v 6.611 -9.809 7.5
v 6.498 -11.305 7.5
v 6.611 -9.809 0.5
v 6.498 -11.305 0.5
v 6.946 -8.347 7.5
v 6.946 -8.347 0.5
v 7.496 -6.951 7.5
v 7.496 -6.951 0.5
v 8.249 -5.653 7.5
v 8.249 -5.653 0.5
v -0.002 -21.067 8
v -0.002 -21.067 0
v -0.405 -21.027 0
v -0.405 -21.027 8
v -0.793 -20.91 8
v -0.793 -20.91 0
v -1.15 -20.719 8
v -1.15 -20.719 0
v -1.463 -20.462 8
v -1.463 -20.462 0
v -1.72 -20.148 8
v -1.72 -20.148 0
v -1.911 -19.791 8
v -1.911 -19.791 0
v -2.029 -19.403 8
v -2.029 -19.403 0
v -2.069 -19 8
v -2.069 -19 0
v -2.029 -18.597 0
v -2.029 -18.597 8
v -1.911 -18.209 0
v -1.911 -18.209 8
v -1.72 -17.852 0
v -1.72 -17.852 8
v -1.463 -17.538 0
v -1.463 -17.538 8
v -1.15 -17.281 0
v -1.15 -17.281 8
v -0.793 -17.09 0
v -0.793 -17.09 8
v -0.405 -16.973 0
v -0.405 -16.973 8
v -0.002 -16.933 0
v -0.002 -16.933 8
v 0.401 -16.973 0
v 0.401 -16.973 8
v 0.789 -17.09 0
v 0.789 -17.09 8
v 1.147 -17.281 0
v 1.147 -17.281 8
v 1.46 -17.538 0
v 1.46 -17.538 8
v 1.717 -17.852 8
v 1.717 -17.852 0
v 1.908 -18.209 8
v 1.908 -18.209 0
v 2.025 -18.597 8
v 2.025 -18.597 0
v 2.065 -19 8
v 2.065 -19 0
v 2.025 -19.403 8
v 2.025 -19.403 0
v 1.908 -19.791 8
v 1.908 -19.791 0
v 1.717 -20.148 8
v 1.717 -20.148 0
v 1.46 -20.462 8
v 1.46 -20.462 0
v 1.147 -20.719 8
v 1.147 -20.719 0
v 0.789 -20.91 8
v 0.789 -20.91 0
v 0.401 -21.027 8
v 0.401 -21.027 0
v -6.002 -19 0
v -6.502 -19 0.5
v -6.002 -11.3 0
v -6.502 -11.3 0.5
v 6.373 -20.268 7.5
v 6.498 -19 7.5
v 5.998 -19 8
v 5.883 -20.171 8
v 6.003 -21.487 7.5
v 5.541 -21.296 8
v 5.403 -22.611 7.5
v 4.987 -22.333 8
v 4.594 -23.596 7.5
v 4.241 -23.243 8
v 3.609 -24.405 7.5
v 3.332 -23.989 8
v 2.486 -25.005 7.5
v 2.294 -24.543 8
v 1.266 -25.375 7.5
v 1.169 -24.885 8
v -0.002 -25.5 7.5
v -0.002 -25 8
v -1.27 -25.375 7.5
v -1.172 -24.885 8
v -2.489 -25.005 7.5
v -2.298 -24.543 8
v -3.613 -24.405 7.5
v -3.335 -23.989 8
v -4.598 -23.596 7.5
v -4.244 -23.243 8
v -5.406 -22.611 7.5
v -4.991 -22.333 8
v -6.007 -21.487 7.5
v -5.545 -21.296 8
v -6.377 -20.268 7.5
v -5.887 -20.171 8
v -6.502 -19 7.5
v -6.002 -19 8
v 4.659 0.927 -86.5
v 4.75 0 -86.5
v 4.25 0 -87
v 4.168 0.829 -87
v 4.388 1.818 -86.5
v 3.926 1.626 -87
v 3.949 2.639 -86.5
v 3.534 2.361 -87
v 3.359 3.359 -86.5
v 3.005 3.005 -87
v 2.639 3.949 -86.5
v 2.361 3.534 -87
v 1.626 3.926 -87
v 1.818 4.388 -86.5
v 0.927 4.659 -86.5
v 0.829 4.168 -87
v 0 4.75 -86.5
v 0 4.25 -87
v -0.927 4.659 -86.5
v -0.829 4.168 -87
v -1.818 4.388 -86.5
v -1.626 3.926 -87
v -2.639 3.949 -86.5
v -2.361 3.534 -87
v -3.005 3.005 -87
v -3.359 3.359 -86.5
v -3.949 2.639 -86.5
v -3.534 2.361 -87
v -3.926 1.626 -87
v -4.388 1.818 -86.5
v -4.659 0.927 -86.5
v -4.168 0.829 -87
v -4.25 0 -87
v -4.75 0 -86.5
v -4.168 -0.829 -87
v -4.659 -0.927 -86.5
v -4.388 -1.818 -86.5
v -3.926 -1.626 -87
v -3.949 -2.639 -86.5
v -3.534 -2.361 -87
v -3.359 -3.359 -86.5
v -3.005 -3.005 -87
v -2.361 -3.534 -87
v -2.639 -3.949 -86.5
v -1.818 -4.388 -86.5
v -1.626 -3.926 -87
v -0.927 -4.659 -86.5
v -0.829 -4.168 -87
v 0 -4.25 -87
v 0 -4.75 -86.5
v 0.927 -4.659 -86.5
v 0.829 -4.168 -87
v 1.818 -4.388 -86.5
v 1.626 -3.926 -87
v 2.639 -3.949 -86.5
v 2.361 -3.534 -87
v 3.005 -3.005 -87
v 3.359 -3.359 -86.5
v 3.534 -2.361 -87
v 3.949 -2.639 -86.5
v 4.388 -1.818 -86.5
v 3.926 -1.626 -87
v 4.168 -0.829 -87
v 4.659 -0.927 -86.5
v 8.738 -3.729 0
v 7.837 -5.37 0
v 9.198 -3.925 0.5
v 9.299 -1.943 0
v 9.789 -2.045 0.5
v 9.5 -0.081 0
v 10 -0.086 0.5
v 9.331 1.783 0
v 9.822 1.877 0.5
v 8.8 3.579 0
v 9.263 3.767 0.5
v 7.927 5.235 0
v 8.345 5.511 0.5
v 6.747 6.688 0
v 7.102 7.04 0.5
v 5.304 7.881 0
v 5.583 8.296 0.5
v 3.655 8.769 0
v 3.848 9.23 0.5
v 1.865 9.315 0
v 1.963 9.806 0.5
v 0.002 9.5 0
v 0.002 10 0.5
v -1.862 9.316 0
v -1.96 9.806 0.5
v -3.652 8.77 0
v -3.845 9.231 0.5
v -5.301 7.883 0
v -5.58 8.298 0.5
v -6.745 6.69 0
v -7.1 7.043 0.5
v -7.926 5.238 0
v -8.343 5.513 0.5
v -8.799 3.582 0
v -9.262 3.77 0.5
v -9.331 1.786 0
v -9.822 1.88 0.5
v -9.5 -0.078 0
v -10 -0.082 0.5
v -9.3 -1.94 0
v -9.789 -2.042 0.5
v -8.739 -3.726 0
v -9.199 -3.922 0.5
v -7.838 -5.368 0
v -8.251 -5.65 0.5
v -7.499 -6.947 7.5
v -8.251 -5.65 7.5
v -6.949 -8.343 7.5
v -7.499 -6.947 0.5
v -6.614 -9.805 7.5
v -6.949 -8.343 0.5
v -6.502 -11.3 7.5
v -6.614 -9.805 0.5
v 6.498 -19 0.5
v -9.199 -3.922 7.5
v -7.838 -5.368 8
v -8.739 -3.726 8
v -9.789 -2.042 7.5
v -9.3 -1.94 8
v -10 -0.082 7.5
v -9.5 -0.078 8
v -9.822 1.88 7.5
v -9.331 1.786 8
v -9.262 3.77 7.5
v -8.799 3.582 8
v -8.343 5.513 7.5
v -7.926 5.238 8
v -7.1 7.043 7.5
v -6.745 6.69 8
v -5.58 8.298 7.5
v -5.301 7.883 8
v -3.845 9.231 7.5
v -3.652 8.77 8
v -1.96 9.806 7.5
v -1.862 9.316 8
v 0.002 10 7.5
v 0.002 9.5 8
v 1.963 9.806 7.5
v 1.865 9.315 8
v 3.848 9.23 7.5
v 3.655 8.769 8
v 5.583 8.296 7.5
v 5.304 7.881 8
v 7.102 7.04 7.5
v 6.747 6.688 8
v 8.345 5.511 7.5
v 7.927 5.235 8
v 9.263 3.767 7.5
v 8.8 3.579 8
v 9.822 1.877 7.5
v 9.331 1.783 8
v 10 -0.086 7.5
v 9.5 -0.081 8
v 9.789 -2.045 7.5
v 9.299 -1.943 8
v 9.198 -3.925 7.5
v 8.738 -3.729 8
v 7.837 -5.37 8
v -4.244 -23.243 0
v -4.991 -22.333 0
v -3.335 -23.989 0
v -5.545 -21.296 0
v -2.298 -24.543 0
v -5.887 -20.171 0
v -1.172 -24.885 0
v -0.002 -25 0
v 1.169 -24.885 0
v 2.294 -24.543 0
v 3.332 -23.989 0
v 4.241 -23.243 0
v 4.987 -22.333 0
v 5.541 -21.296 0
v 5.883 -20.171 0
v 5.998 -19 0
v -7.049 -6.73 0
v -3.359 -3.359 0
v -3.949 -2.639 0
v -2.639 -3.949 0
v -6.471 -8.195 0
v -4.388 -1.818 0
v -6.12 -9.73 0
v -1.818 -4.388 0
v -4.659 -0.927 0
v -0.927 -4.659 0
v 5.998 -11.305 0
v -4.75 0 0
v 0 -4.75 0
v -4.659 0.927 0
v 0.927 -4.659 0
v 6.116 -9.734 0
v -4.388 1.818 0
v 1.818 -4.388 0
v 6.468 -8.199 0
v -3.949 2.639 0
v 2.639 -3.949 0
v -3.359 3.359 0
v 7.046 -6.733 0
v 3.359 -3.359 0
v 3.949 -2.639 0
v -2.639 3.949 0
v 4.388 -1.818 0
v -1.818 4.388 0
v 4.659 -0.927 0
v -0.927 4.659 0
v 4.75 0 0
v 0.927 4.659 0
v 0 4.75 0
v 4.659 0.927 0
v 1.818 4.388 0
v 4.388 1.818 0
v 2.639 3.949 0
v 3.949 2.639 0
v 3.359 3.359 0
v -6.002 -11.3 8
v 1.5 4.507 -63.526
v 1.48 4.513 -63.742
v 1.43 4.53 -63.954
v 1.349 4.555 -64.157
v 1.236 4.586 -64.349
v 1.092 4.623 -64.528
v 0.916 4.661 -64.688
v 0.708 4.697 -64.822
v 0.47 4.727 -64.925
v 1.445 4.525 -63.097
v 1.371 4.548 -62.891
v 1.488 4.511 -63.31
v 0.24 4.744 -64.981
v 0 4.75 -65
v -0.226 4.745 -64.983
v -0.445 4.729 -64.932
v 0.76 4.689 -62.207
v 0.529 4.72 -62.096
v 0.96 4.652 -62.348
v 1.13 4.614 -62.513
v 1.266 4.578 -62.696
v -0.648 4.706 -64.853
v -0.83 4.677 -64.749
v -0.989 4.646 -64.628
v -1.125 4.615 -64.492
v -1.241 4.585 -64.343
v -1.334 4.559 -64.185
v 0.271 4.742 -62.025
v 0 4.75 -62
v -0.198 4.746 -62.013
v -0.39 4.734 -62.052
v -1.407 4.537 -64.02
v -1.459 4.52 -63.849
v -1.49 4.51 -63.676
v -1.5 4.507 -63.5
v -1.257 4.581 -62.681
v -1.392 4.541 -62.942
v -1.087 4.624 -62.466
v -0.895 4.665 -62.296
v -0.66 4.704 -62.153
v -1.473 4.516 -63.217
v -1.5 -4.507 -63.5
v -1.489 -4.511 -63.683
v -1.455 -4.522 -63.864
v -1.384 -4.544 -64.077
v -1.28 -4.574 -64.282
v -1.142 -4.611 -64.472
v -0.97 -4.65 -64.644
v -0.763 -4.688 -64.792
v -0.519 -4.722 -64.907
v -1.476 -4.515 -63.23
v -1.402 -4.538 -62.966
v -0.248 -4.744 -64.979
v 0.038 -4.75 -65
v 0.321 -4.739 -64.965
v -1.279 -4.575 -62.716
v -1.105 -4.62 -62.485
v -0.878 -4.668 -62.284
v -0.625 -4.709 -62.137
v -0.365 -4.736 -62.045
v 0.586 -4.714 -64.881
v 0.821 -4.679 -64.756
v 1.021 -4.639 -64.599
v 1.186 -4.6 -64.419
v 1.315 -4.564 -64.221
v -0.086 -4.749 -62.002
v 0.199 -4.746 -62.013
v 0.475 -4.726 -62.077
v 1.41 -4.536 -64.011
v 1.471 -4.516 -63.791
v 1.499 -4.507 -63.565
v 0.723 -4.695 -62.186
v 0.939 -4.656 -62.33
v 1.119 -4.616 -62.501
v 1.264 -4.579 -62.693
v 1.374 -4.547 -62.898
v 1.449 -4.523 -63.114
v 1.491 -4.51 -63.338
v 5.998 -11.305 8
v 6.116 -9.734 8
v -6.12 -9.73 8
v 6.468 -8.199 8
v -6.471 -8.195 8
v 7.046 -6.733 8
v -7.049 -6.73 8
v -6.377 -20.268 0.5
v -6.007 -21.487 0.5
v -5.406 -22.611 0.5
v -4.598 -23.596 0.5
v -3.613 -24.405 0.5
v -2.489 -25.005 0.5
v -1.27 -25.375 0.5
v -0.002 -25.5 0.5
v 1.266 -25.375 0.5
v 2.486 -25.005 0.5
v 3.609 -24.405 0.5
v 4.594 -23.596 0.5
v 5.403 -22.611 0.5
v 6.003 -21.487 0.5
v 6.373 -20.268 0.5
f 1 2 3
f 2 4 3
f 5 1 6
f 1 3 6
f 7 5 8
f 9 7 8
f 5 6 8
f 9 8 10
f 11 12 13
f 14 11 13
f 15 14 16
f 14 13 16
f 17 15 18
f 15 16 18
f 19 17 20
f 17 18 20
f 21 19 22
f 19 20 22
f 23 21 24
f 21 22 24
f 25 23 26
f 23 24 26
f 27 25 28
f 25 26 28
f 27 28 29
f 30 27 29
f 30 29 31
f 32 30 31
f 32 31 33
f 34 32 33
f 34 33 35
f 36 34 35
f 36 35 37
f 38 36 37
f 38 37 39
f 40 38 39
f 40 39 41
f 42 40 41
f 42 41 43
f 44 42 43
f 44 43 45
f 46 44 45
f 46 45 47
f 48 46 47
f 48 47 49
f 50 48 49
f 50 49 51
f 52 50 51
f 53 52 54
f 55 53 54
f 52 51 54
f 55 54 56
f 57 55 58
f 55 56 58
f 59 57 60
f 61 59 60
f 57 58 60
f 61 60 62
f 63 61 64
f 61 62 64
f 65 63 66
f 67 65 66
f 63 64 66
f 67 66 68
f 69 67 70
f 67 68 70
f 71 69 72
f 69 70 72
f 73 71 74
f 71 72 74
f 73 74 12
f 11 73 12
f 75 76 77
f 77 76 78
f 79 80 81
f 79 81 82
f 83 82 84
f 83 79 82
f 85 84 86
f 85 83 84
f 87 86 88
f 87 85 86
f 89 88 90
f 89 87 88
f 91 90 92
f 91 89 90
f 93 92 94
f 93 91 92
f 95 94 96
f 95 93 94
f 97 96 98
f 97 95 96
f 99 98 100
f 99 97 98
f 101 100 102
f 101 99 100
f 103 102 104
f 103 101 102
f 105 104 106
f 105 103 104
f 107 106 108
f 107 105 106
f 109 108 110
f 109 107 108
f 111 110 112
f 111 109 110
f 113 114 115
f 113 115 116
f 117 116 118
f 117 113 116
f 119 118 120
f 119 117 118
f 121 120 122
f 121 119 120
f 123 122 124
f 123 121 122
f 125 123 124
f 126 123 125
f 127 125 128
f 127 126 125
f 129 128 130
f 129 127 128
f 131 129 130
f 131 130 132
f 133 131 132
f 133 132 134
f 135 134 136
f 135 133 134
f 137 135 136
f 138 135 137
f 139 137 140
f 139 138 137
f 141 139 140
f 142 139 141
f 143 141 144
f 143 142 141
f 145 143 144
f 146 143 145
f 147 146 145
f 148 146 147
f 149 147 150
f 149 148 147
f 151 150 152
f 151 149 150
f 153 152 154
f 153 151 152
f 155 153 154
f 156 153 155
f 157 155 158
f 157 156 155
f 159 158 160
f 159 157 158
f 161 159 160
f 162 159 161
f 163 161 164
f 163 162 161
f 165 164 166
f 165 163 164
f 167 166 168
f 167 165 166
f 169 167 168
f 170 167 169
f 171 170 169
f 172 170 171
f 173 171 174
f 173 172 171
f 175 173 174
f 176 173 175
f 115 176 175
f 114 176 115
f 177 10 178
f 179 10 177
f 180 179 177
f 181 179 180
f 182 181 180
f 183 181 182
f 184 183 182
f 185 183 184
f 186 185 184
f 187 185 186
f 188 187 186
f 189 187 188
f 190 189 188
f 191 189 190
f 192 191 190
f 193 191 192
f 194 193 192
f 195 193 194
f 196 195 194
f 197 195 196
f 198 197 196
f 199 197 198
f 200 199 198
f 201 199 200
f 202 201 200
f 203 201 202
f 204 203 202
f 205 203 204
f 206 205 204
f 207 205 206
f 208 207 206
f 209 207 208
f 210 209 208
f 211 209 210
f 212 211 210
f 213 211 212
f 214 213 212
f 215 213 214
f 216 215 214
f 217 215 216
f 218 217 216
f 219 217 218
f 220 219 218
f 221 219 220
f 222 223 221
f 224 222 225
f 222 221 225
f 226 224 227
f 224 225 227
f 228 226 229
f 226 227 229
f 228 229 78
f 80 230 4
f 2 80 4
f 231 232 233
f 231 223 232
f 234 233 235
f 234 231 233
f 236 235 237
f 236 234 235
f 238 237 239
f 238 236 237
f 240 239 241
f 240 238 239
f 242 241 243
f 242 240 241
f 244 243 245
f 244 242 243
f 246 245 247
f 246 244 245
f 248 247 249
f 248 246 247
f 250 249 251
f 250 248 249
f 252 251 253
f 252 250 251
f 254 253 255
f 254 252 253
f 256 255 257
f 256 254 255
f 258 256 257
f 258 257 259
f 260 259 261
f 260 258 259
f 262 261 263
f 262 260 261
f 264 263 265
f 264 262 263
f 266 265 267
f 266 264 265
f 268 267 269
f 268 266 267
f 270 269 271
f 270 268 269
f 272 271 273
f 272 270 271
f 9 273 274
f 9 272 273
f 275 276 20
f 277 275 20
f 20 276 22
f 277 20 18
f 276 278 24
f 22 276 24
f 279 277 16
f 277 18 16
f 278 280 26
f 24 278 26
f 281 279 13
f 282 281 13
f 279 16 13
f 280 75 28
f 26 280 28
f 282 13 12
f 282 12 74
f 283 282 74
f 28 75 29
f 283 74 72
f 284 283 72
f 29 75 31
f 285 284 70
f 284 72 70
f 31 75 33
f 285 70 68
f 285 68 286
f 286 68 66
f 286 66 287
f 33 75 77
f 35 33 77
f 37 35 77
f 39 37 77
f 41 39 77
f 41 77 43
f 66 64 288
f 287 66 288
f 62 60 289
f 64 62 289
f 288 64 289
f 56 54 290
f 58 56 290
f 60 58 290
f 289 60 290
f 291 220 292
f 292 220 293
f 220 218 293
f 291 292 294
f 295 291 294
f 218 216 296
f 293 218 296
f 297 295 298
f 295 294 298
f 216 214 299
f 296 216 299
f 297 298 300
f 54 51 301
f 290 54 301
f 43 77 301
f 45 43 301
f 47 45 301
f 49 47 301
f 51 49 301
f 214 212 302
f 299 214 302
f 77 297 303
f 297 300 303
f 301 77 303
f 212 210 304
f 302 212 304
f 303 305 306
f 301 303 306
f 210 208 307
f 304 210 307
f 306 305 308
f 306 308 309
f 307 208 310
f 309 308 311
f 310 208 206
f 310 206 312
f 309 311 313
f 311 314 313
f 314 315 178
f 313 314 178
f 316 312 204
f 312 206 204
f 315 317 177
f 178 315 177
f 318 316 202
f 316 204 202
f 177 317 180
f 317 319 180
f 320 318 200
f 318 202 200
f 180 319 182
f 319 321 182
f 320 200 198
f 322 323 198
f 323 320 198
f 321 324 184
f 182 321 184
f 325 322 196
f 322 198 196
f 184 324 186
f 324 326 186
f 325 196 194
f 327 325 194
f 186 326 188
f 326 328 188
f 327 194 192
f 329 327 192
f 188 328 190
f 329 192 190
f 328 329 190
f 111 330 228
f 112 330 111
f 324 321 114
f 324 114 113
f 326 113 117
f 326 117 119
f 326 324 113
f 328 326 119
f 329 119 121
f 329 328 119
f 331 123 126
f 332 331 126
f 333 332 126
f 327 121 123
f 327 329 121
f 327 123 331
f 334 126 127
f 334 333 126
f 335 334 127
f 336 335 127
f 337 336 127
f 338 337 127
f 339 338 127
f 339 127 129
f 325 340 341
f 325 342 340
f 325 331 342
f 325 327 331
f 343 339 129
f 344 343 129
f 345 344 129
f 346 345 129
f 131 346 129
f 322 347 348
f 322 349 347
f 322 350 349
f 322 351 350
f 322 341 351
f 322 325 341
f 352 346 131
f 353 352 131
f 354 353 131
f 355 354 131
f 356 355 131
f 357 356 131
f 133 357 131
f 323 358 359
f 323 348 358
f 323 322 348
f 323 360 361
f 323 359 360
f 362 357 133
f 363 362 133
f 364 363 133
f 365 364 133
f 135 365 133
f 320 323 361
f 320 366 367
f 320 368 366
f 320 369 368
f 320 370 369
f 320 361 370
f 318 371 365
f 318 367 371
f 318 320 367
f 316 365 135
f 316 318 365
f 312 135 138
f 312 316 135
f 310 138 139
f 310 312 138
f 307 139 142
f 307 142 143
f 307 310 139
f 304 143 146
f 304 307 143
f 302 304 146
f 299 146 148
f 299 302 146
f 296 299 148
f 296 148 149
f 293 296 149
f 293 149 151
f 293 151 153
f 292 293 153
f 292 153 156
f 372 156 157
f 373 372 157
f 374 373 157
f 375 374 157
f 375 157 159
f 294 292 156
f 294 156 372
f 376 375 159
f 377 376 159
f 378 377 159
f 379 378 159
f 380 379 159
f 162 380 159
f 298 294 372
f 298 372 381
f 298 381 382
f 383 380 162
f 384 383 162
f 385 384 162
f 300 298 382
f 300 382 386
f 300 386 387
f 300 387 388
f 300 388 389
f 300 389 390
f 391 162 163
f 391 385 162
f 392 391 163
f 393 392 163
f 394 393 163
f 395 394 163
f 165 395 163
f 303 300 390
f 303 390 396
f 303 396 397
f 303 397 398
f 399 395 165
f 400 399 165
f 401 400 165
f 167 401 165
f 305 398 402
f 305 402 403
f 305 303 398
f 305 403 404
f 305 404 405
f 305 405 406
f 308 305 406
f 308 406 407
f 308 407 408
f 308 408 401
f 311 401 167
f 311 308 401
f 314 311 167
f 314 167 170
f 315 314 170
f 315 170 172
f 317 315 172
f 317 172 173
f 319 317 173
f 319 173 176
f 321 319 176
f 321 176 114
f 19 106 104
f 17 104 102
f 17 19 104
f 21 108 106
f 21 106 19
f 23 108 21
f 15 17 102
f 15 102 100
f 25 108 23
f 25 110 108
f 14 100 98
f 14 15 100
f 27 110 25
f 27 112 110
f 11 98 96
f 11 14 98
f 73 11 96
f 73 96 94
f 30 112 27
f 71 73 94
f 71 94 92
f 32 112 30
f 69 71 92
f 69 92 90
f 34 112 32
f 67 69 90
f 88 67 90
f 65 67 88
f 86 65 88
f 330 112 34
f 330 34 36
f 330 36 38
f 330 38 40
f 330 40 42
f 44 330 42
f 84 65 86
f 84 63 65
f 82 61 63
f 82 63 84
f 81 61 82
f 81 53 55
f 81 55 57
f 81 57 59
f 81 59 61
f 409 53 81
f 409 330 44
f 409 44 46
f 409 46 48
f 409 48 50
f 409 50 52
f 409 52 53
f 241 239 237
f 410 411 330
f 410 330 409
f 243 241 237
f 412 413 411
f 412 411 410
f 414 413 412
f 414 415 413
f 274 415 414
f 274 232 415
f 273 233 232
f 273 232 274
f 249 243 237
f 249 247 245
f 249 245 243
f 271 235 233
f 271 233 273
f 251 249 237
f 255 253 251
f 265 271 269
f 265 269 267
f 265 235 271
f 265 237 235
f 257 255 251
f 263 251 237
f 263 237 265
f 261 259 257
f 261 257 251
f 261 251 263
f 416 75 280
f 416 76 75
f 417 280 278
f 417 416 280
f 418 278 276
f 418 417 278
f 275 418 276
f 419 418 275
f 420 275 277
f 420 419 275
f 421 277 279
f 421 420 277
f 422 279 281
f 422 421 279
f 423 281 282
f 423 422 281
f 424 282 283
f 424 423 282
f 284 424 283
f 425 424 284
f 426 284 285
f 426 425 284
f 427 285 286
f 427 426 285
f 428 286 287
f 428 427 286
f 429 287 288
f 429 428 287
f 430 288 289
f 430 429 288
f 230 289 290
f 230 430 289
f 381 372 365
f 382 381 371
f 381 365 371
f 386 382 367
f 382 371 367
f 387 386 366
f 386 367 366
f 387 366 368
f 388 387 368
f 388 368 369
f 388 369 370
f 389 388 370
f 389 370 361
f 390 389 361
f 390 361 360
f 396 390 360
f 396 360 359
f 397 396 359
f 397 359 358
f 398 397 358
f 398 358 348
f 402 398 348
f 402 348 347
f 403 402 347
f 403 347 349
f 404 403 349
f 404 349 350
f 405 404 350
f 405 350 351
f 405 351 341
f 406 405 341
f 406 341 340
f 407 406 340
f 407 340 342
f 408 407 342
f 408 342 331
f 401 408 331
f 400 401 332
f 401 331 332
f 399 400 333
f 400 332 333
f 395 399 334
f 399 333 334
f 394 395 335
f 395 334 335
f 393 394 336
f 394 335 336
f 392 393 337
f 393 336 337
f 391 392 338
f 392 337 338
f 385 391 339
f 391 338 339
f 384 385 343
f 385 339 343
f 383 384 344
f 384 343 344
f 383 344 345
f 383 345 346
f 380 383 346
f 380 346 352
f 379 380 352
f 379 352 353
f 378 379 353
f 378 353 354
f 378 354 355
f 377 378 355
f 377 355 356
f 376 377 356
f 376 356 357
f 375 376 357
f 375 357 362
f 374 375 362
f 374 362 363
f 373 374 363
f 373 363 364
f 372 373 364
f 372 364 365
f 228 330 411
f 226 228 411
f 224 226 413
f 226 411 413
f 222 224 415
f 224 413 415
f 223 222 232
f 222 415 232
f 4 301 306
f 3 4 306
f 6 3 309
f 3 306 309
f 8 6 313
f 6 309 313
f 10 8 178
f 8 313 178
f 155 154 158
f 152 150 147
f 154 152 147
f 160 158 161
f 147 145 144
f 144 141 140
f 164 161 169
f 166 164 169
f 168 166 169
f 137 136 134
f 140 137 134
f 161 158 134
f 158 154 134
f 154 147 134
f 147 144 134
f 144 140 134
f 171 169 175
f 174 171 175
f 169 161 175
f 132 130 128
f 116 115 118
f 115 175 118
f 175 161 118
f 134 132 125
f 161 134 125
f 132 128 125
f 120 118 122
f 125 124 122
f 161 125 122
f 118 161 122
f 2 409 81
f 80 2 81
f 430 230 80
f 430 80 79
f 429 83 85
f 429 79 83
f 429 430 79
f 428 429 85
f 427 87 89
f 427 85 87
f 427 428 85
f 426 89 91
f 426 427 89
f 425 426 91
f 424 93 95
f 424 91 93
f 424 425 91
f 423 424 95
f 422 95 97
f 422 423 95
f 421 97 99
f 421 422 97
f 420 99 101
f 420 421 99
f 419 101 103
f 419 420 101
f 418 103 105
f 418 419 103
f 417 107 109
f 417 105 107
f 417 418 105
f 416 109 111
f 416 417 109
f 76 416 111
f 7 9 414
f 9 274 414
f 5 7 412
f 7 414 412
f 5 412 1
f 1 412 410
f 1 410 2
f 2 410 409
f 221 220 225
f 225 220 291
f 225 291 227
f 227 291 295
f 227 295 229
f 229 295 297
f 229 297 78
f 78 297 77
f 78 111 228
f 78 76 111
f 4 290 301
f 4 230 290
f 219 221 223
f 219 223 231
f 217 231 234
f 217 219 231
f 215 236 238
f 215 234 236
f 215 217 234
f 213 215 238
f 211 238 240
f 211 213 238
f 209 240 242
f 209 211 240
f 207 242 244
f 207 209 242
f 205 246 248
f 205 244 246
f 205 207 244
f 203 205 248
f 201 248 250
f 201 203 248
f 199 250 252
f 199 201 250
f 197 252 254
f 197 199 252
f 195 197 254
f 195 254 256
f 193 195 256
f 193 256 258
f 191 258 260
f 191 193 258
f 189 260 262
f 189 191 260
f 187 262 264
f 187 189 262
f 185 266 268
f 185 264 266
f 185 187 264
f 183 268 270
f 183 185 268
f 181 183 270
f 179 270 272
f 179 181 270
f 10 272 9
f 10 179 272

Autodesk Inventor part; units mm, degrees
ref_plane "YZ Plane" through (0, 0, 0) normal (1, 0, 0) x (0, 1, 0)
ref_plane "XY Plane" through (0, 0, 0) normal (0, 0, 1) x (1, 0, 0)
sketch "Sketch1" plane through (0, 0, 0) normal (0, 0, 1) x (1, 0, 0)
  arc A0 (8.2491, -5.6527) -> (-8.2509, -5.65) centre (0, 0) ccw
  arc A1 (-6.5018, -19) -> (6.4982, -19) centre (-0.0018, -19) ccw
  circle A2 centre (0, 0) radius 4.75
  line L0 (-6.5018, -19) -> (-6.5018, -11.3)
  line L1 (6.4982, -19) -> (6.4982, -11.3053)
  arc A3 (-6.5018, -11.3) -> (-8.2509, -5.65) centre (-16.5018, -11.3) ccw
  arc A4 (8.2491, -5.6527) -> (6.4982, -11.3053) centre (16.4982, -11.3053) ccw
  point P0 (-6.5018, -7.5978)
  point P1 (6.4982, -7.6009)
  point P2 (-6.9491, -8.3427)
  dimension "d0" = 20
  dimension "d1" = 9.5
  dimension "d2" = 13
  dimension "d3" = 19
  dimension "d4" = 10
  dimension "d6" = 7.7
extrude "Extrusion1" add sketch "Sketch1" along normal blind 8
sketch "Sketch2" plane through (0, 0, 8) normal (0, 0, 1) x (1, 0, 0)
  arc A0 (-6.5018, -19) -> (6.4982, -19) centre (-0.0018, -19) ccw projected
hole "Hole1" at (-0.0018, -19, 8) direction (0, 0, -1) diameter 4.134 end through all thread size "M5x0.8" class "6H" standard "ANSI Metric M Profile"
sketch "Sketch3" plane through (0, 0, 8) normal (0, 0, 1) x (1, 0, 0)
  circle A0 centre (0, 0) radius 4.75 projected
  circle A1 centre (0, 0) radius 4.75
extrude "Extrusion2" add sketch "Sketch3" against normal blind 95
chamfer "Chamfer1" distance 0.5 angle 45 13 edges at (0.0016, 10, 8) (-6.9491, -8.3427, 8) (-6.5018, -15.15, 8) (-0.0018, -25.5, 8) (6.4982, -15.1527, 8) (6.9459, -8.3465, 8) (-4.75, 0, -87) (-0.0018, -25.5, 0) (6.4982, -15.1527, 0) (6.9459, -8.3465, 0) (0.0016, 10, 0) (-6.9491, -8.3427, 0) (-6.5018, -15.15, 0)
ref_plane "Work Plane1" through (0, 4.75, 0) normal (0, 1, 0) x (-1, 0, 0)
sketch "Sketch4" plane through (0, 4.75, 0) normal (0, 1, 0) x (-1, 0, 0)
  circle A0 centre (0, -63.5) radius 1.5
  line L0 (-4.75, -87) -> (4.75, -87) projected
  point P0 (0, 0)
  point P1 (0, -87)
  dimension "d22" = 3
  dimension "d23" = 23.5
extrude "Extrusion3" cut sketch "Sketch4" against normal through all
properties part number "Crankshaft" material "Steel AISI 1020 107 HR"
